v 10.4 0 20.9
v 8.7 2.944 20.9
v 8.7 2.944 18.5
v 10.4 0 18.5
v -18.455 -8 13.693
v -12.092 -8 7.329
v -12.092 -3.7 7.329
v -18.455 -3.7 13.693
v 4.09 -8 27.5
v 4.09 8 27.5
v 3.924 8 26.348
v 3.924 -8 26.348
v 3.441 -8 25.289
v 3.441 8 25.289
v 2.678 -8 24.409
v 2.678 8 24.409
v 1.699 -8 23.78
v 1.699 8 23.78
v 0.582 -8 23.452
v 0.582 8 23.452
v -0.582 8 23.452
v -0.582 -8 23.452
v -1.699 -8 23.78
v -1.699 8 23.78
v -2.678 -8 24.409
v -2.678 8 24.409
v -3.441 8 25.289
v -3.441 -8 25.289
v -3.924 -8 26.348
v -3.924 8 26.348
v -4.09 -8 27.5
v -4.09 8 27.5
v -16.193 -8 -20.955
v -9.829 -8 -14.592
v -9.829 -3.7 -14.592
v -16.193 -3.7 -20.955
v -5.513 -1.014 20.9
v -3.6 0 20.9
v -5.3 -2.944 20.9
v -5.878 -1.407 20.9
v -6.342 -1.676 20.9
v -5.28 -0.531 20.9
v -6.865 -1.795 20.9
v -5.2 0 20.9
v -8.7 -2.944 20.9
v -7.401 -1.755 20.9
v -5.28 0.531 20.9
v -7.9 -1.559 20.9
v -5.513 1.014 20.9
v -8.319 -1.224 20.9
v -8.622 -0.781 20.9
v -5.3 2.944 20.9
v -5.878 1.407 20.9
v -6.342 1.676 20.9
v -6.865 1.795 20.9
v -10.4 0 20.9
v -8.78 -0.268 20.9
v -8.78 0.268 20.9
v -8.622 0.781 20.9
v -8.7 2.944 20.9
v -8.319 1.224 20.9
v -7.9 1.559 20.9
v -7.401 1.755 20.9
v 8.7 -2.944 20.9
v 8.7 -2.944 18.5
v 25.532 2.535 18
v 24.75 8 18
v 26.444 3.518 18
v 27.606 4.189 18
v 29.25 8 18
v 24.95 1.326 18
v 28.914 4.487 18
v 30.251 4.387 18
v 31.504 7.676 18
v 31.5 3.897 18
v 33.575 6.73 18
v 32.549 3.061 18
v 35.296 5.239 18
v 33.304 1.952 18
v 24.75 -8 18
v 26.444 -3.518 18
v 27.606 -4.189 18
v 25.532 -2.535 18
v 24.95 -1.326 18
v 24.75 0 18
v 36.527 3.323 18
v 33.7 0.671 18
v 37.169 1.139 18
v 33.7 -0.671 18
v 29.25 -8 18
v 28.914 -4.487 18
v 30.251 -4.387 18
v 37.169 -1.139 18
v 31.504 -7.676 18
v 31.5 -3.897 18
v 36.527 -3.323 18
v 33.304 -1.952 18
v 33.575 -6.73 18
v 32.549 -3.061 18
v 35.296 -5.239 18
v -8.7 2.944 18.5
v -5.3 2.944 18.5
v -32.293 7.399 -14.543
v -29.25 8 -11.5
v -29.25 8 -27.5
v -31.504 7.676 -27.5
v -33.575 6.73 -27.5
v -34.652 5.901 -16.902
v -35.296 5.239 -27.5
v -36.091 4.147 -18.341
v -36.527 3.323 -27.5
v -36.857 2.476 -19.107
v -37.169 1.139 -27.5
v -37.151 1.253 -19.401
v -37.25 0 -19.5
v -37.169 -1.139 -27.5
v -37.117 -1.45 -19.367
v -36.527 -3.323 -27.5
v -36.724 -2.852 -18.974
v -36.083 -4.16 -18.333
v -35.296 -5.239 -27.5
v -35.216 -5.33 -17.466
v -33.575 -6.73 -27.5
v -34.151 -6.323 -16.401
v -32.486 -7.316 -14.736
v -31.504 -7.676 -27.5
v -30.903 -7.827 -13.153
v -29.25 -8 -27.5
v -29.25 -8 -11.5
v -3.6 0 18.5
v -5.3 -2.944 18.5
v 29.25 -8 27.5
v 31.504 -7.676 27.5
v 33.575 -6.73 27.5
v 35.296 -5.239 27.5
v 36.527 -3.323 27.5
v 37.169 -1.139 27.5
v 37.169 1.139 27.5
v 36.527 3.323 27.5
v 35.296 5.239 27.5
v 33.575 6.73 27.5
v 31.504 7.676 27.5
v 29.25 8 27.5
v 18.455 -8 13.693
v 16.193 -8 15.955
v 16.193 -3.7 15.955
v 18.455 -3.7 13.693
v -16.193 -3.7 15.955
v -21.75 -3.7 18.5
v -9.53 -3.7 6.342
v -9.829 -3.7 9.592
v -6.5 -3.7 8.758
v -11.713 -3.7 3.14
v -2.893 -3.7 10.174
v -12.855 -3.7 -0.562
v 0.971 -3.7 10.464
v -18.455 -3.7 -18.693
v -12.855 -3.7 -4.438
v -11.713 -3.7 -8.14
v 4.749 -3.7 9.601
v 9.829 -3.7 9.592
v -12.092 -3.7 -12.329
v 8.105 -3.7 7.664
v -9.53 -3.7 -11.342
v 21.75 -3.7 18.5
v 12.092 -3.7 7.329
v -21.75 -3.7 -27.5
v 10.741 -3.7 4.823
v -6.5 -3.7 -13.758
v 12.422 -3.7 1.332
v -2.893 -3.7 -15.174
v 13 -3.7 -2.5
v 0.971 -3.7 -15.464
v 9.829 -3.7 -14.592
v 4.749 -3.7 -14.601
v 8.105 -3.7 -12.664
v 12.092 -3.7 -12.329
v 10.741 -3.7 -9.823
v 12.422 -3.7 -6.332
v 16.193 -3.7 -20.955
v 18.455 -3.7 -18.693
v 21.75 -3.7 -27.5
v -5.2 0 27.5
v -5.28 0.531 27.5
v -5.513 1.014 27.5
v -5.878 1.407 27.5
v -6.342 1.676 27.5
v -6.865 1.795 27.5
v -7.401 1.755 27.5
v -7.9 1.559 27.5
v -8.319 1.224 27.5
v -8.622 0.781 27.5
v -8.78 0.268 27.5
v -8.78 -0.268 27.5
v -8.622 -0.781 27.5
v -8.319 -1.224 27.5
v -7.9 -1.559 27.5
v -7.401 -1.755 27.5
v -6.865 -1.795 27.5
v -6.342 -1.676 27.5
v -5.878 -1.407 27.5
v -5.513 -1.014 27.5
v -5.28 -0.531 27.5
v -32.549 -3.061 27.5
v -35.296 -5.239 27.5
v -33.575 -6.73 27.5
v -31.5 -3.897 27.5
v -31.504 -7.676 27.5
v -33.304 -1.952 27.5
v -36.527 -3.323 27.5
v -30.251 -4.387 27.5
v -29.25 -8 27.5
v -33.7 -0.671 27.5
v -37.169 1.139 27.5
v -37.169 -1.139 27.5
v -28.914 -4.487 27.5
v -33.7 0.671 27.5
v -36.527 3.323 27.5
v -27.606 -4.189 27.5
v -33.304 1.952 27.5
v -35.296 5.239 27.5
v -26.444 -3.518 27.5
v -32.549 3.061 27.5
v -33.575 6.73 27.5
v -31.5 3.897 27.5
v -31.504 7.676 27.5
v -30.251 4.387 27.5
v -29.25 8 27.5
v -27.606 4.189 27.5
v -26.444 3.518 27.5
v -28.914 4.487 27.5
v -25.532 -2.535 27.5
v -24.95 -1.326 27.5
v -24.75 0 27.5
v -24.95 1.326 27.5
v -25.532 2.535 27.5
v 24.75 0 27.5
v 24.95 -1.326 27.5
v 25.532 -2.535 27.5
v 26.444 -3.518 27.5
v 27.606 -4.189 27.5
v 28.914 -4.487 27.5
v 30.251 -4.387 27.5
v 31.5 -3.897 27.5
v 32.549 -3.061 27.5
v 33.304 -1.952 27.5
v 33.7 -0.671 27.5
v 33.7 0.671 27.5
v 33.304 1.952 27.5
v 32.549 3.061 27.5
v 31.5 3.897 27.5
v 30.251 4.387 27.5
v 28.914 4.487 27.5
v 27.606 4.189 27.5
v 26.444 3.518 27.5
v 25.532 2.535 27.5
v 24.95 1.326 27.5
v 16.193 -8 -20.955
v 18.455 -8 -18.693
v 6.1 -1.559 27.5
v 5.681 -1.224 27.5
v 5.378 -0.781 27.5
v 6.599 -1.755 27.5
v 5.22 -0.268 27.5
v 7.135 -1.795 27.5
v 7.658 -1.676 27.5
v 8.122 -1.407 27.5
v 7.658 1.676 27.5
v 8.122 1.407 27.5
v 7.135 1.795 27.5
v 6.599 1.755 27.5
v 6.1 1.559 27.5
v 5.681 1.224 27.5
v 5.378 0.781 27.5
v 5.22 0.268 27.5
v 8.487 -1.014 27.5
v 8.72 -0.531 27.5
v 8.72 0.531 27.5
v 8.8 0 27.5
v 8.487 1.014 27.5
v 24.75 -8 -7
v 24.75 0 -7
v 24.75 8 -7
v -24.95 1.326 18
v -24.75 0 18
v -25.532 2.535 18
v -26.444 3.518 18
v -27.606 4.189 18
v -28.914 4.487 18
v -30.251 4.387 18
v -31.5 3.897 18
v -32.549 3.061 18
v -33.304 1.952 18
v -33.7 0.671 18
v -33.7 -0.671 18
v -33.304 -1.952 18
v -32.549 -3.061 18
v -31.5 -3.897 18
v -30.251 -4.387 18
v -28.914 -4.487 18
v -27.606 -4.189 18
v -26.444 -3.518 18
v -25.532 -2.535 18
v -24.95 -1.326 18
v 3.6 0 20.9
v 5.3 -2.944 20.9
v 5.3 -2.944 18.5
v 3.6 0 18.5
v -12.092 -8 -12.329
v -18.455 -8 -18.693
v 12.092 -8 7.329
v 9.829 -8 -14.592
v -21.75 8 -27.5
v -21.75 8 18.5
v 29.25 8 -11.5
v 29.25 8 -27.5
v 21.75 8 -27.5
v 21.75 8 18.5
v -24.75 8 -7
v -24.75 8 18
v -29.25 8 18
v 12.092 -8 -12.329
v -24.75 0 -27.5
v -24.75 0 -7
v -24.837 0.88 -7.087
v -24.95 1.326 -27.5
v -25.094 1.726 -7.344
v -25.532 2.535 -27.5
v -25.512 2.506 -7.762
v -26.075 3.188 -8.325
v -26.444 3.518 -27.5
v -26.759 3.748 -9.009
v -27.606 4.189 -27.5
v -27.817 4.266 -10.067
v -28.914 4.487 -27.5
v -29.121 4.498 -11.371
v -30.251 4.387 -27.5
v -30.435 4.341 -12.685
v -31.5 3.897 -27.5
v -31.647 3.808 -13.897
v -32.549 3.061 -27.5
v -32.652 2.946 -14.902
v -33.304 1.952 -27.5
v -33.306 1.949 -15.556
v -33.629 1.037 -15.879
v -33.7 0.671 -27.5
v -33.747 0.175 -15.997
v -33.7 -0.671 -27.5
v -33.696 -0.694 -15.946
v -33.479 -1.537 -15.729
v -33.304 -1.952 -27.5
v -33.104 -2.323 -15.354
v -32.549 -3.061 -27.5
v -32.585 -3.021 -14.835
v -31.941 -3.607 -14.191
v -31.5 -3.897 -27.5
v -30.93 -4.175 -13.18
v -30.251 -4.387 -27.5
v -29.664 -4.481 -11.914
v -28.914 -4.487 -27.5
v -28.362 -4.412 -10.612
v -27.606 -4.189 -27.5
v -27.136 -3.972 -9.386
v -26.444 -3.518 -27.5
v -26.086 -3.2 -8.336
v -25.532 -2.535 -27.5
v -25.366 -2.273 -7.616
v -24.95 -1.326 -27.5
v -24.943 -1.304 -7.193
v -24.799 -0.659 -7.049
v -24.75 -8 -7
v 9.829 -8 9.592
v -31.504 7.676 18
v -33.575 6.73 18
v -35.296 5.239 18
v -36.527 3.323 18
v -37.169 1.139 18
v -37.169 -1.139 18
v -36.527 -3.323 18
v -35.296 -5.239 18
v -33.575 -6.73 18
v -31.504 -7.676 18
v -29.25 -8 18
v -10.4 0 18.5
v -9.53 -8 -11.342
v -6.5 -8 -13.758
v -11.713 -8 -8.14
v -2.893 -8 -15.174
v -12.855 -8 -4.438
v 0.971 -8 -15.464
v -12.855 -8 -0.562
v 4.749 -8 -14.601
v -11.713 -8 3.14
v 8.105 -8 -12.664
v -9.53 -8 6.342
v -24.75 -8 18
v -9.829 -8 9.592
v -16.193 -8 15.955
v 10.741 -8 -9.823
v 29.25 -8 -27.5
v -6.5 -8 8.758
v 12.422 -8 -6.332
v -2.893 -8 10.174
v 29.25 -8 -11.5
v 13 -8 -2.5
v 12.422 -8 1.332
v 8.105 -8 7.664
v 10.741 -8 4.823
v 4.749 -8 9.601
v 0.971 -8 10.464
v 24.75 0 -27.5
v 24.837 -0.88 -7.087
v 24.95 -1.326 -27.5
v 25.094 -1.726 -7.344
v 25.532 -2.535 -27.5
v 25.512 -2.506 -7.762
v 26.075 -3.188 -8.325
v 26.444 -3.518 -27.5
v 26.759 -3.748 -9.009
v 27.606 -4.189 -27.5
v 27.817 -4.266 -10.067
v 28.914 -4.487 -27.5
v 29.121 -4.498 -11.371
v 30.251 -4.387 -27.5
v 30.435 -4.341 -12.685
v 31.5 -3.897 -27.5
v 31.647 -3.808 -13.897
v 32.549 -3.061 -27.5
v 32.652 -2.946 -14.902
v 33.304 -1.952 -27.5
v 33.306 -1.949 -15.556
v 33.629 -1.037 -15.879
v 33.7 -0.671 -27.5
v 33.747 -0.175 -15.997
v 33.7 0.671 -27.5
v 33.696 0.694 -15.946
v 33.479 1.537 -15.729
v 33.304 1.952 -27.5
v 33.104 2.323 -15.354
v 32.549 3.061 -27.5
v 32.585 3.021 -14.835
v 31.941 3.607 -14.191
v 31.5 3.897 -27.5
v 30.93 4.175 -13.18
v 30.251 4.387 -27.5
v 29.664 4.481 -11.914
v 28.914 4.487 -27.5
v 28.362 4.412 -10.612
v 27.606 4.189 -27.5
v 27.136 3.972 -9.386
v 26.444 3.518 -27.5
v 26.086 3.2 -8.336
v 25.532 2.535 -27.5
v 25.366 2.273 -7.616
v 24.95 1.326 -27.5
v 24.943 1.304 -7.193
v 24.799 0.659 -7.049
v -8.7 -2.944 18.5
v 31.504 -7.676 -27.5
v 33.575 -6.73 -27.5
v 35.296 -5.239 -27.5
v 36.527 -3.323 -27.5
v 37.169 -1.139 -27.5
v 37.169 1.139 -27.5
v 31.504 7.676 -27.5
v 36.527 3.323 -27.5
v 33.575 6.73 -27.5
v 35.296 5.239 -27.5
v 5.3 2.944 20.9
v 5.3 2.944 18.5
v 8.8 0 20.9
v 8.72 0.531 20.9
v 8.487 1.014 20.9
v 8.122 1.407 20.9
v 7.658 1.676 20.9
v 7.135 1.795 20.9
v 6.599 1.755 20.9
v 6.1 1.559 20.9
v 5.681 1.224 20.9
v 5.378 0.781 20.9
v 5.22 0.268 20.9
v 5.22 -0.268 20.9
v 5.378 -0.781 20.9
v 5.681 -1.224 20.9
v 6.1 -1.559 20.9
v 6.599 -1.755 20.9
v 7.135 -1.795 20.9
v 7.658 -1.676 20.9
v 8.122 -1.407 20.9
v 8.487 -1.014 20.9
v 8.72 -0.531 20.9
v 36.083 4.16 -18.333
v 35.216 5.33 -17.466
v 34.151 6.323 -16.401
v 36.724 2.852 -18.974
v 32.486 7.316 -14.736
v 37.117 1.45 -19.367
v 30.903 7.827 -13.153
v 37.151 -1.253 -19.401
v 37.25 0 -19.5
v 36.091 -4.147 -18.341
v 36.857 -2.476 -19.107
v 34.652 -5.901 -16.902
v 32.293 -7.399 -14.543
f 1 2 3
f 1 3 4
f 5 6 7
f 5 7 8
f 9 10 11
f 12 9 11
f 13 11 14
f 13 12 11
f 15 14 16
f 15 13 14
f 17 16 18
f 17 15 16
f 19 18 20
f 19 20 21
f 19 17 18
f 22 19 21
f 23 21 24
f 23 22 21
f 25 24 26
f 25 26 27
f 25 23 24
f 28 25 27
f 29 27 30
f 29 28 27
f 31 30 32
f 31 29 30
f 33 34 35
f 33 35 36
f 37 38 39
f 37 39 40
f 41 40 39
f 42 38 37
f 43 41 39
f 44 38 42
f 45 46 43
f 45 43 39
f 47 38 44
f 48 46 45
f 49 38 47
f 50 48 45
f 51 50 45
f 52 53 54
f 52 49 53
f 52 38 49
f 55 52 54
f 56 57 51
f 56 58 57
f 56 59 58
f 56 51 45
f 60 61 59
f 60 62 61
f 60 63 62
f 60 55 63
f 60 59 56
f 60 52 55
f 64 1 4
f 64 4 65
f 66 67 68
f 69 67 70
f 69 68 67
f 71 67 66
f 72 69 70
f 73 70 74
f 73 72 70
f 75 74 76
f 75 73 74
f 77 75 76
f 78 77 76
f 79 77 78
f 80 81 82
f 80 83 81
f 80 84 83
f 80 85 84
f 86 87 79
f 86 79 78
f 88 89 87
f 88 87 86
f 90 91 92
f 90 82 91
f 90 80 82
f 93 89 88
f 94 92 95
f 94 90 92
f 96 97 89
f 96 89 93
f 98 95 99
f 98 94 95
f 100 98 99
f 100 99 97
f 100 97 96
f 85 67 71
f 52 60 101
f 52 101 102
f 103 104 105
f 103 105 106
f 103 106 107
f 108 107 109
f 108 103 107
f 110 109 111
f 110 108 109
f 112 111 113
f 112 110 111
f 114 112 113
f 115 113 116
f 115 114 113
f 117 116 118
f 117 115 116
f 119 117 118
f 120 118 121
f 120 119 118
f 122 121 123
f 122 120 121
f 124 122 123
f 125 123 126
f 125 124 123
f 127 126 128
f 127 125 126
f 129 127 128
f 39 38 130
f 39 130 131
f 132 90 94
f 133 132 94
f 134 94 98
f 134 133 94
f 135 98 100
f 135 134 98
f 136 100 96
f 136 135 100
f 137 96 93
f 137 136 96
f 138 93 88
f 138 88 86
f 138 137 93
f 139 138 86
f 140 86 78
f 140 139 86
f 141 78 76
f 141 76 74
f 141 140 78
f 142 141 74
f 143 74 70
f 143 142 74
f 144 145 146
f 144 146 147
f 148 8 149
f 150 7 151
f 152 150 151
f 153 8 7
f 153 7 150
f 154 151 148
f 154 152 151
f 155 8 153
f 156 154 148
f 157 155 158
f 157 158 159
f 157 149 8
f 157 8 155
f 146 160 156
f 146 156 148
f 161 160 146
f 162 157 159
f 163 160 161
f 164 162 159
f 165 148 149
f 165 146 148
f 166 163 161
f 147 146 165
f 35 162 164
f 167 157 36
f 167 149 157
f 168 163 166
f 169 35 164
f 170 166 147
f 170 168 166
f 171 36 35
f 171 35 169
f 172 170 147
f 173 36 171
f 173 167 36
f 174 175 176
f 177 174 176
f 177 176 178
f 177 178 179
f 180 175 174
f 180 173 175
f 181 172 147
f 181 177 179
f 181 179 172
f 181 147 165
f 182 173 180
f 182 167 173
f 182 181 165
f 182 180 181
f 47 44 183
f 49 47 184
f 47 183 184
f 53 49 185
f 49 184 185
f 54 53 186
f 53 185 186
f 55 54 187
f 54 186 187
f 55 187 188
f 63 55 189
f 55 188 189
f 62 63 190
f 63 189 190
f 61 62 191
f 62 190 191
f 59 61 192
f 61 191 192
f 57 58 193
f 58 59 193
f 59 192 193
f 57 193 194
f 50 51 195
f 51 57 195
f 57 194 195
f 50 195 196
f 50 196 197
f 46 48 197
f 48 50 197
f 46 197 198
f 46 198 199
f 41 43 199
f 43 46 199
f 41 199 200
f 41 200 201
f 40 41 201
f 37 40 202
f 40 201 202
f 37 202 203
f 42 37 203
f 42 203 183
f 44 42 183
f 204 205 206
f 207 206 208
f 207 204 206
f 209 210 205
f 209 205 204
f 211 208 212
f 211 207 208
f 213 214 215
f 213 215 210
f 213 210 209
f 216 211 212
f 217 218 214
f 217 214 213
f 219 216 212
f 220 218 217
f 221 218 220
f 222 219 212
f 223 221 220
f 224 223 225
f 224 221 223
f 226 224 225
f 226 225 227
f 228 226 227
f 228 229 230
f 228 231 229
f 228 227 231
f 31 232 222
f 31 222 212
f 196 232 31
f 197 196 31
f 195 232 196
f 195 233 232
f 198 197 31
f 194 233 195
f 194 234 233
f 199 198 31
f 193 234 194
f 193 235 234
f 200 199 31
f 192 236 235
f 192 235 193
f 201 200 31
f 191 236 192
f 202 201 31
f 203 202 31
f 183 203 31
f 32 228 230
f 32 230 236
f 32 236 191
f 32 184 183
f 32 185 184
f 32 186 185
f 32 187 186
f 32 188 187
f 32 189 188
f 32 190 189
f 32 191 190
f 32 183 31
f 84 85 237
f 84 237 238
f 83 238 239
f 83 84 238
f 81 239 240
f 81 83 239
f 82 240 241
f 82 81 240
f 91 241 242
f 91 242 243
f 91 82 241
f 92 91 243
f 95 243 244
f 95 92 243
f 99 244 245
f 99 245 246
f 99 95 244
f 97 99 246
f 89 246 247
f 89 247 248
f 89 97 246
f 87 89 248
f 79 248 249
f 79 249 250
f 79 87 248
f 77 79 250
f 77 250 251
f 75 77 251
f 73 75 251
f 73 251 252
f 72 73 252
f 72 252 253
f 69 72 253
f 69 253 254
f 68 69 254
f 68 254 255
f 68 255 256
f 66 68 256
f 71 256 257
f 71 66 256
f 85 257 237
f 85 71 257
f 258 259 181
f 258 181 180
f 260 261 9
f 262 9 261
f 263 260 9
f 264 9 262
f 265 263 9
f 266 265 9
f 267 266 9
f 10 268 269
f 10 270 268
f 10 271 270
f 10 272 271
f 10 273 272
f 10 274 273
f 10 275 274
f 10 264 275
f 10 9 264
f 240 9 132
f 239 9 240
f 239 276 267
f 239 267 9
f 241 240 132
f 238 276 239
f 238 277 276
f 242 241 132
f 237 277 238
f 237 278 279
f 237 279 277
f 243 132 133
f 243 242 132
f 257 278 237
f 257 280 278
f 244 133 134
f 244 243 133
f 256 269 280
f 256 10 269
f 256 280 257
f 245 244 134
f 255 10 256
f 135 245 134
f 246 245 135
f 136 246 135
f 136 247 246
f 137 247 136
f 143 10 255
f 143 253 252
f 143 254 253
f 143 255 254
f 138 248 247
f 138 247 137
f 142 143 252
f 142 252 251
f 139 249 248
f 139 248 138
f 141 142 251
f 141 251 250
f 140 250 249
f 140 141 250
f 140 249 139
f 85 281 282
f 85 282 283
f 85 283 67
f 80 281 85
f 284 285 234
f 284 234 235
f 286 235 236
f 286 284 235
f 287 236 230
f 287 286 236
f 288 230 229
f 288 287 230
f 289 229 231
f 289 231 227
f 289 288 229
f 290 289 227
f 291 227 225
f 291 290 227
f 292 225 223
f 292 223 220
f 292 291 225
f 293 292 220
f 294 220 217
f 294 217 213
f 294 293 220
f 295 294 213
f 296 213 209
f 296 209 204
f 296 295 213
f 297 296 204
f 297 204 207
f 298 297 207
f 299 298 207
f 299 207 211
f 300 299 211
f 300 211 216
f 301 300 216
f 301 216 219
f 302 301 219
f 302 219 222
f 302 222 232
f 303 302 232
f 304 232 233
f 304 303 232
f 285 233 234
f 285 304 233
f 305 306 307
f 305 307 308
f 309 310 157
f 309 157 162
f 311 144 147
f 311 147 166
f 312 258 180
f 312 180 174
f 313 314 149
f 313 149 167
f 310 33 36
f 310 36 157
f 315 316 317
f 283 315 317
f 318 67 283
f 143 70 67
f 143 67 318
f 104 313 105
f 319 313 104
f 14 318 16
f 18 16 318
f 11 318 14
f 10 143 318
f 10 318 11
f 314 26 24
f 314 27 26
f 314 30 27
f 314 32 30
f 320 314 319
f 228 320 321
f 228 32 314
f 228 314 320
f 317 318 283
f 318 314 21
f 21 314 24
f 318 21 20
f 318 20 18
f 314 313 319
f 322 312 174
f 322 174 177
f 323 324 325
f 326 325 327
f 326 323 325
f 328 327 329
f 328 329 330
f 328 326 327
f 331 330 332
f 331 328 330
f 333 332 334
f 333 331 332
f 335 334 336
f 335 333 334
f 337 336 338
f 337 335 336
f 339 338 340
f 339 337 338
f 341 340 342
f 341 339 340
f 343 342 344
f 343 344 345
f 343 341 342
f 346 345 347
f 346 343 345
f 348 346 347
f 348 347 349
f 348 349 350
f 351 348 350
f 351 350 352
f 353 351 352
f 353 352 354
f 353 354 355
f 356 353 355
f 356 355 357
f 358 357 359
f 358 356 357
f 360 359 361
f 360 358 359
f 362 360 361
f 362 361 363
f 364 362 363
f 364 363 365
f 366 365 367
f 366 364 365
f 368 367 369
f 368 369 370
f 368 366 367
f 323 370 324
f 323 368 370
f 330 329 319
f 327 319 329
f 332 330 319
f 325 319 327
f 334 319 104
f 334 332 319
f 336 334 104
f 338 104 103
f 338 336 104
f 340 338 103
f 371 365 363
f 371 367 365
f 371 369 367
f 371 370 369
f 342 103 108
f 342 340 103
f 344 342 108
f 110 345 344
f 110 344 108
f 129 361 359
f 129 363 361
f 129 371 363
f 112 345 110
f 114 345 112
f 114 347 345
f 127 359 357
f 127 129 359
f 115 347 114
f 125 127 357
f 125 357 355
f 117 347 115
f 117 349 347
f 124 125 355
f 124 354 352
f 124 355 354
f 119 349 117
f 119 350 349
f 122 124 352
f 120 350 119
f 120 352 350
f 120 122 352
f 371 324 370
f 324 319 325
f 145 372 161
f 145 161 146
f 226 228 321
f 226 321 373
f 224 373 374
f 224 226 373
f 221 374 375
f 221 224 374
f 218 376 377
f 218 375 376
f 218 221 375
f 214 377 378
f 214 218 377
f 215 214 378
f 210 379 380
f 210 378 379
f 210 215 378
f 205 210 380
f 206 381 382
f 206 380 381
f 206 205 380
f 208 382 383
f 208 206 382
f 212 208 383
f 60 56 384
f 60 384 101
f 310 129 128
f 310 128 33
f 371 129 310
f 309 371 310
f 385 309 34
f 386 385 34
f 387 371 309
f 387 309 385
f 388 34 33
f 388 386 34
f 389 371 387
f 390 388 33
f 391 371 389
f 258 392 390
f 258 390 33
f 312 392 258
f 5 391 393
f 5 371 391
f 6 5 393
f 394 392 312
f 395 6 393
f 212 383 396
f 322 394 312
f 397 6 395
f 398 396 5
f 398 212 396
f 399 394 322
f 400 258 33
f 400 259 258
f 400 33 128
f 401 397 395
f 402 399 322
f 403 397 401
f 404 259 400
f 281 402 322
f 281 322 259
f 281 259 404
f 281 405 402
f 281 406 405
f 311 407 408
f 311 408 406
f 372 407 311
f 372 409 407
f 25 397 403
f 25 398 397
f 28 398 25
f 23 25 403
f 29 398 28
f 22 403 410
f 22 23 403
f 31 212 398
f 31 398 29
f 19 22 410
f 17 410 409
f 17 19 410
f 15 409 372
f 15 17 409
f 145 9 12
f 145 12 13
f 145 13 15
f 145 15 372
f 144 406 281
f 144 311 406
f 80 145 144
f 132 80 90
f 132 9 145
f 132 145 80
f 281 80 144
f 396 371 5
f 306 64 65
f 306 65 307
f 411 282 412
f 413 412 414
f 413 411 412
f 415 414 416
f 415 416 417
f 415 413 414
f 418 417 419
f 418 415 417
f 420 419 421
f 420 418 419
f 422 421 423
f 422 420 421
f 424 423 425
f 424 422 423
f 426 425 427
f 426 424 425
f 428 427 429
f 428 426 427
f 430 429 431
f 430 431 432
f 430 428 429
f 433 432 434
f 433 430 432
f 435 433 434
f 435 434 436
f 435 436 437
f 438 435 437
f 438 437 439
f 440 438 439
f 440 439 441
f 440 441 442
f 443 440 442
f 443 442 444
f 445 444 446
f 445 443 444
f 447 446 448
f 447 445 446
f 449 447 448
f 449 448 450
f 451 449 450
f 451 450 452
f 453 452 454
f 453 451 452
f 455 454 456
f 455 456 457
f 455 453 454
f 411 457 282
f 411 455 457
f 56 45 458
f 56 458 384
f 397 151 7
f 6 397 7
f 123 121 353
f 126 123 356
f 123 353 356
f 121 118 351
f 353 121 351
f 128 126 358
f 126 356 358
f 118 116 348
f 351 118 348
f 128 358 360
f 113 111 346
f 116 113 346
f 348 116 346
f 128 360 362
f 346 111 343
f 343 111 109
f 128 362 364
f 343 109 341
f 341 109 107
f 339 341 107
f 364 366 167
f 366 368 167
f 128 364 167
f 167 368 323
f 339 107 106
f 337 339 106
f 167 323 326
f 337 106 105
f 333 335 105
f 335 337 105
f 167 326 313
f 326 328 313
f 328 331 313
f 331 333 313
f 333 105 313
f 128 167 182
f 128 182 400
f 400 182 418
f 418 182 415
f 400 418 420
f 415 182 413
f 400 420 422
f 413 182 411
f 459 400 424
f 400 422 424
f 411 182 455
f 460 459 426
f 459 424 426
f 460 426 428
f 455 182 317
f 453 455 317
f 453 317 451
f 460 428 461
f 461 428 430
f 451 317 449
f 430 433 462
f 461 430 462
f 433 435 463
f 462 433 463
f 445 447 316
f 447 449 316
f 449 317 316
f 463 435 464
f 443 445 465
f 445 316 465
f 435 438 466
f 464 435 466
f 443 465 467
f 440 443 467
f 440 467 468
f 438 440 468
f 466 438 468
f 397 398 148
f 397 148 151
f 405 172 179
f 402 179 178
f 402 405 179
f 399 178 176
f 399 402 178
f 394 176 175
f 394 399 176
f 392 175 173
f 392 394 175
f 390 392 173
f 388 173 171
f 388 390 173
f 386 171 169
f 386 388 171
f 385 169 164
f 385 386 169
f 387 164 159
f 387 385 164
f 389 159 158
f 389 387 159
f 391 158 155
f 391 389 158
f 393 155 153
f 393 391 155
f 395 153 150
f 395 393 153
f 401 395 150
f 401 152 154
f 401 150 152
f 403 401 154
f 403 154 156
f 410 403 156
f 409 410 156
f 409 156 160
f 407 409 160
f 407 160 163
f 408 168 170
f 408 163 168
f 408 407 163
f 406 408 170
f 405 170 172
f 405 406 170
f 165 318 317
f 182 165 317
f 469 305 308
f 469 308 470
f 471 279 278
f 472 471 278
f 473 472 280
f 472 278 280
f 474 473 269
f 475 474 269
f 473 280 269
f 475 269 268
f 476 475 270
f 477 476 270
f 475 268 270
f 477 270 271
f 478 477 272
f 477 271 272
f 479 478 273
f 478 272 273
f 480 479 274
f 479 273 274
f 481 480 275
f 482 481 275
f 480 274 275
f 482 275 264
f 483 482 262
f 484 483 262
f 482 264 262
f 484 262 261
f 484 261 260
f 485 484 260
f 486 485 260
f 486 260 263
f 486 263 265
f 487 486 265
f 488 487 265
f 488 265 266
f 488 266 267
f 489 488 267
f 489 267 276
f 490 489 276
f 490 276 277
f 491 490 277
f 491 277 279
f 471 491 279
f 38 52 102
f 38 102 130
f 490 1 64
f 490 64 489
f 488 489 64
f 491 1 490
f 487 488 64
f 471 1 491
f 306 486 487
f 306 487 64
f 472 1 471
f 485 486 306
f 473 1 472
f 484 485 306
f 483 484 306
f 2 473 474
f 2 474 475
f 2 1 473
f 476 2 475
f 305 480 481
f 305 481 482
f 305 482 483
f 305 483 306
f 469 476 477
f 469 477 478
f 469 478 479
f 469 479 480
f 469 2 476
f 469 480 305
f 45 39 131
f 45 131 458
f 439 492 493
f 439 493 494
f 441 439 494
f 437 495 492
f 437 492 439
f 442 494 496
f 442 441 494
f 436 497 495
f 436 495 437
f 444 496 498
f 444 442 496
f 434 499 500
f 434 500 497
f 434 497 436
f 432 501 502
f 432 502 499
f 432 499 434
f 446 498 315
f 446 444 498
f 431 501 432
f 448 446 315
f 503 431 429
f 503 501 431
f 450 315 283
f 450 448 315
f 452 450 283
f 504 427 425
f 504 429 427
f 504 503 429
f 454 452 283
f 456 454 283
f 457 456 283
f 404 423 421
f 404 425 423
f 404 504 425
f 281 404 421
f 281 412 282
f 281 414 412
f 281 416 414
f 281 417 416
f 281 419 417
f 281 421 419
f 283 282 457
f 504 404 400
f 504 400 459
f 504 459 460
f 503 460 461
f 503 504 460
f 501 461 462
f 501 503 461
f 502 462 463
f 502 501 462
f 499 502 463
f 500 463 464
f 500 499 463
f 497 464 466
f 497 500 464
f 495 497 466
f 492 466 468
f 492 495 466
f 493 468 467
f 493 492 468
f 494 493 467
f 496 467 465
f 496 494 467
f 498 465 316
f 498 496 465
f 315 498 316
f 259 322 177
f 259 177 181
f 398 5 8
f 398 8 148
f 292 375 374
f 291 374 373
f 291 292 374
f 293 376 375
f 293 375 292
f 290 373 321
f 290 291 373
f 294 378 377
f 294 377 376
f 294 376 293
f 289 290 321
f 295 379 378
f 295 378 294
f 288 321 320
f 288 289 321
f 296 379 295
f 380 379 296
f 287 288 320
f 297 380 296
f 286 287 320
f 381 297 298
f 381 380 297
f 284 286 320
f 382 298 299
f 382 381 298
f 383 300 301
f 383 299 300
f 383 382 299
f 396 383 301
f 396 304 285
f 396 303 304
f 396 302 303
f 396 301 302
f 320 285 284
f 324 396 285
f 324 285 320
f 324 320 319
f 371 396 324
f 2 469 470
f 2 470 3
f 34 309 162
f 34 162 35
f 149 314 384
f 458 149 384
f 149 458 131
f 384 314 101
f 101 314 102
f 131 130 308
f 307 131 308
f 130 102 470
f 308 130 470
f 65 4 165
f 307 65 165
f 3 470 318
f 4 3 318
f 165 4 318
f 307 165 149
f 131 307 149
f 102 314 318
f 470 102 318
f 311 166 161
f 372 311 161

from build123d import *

# Parameters (mm, degrees)
SCHIZZO1_R        = 4.5
BASE_DEPTH        = 27.5
SCHIZZO3_R        = 13
HOLES_DEPTH       = 49.987881154
SCHIZZO5_W        = 43.5
SCHIZZO5_H        = 46
FLANGE_DEPTH      = 11.7
SCREW_HOLES_REACH = 68.907
SCHIZZO6_R        = 1.8
NUT_START         = -2.4
SCHIZZO7_R        = 1.8
NUT_HOLES_DEPTH   = 2.4


with BuildPart() as part:
    # Schizzo1 → Base (new, symmetric)
    with BuildSketch(Plane.XY):
        with BuildLine():
            Line((-29.25, -8), (29.25, -8))
            ThreePointArc((29.25, -8), (37.25, 0), (29.25, 8))
            Line((29.25, 8), (-29.25, 8))
            ThreePointArc((-29.25, 8), (-37.25, 0), (-29.25, -8))
        make_face()
        with Locations((-29.25, 0)):
            Circle(SCHIZZO1_R, mode=Mode.SUBTRACT)
        with Locations((29.25, 0)):
            Circle(SCHIZZO1_R, mode=Mode.SUBTRACT)
    extrude(amount=BASE_DEPTH, both=True)

    # Schizzo3 → Holes (cut, through all)
    with BuildSketch(Plane(origin=(0, 8, 0), x_dir=(1, 0, 0), z_dir=(0, 1, 0))):
        Polygon((9.828784258, 14.591525958), (12.091525958, 12.328784258), (18.455486989, 18.692745289), (16.192745289, 20.955486989), align=None)
        with BuildLine():
            Line((-4.09, -27.5), (4.09, -27.5))
            ThreePointArc((4.09, -27.5), (0, -23.41), (-4.09, -27.5))
        make_face()
        Polygon((37.25, -18), (37.25, 19.5), (24.75, 7), (24.75, -18), align=None)
        Polygon((-24.75, 7), (-37.25, 19.5), (-37.25, -18), (-24.75, -18), align=None)
        Polygon((-12.091525958, 12.328784258), (-9.828784258, 14.591525958), (-16.192745289, 20.955486989), (-18.455486989, 18.692745289), align=None)
        Polygon((12.091525958, -7.328784258), (9.828784258, -9.591525958), (16.192745289, -15.955486989), (18.455486989, -13.692745289), align=None)
        Polygon((-9.828784258, -9.591525958), (-12.091525958, -7.328784258), (-18.455486989, -13.692745289), (-16.192745289, -15.955486989), align=None)
        with Locations((0, 2.5)):
            Circle(SCHIZZO3_R)
    extrude(amount=-HOLES_DEPTH, mode=Mode.SUBTRACT)

    # Schizzo5 → Flange (cut)
    with BuildSketch(Plane(origin=(0, 8, 0), x_dir=(1, 0, 0), z_dir=(0, 1, 0))):
        with Locations((0, 4.5)):
            Rectangle(SCHIZZO5_W, SCHIZZO5_H)
    extrude(amount=-FLANGE_DEPTH, mode=Mode.SUBTRACT)

    # Schizzo6 → Screw holes (cut, up to next)
    with BuildSketch(Plane.XY.offset(27.5), mode=Mode.PRIVATE) as screw_holes_sk1:
        with Locations((7, 0)):
            Circle(SCHIZZO6_R)
    screw_holes_tool1 = extrude(screw_holes_sk1.sketch, amount=-SCREW_HOLES_REACH, mode=Mode.PRIVATE) & part.part
    # Schizzo6 → Screw holes (cut, up to next)
    with BuildSketch(Plane.XY.offset(27.5), mode=Mode.PRIVATE) as screw_holes_sk2:
        with Locations((-7, 0)):
            Circle(SCHIZZO6_R)
    screw_holes_tool2 = extrude(screw_holes_sk2.sketch, amount=-SCREW_HOLES_REACH, mode=Mode.PRIVATE) & part.part
    add(screw_holes_tool1.solids().sort_by_distance((7, 0, 27.5))[0], mode=Mode.SUBTRACT)
    add(screw_holes_tool2.solids().sort_by_distance((-7, 0, 27.5))[0], mode=Mode.SUBTRACT)

    # Schizzo7 → Nut holes (cut)
    # profile 1 of 2: a face of its own
    with BuildSketch(Plane(origin=(0, 0, 18.5), x_dir=(-1, 0, 0), z_dir=(0, 0, -1)).offset(NUT_START)):
        Polygon((-3.6, 0), (-5.3, 2.944486373), (-8.7, 2.944486373), (-10.4, 0), (-8.7, -2.944486373), (-5.3, -2.944486373), align=None)
    # profile 2 of 2: a face of its own
    with BuildSketch(Plane(origin=(0, 0, 18.5), x_dir=(-1, 0, 0), z_dir=(0, 0, -1)).offset(NUT_START)):
        Polygon((10.4, 0), (8.7, 2.944486373), (5.3, 2.944486373), (3.6, 0), (5.3, -2.944486373), (8.7, -2.944486373), align=None)
        with Locations((7, 0)):
            Circle(SCHIZZO7_R, mode=Mode.SUBTRACT)
    extrude(amount=NUT_HOLES_DEPTH, mode=Mode.SUBTRACT)


solid = part.part
